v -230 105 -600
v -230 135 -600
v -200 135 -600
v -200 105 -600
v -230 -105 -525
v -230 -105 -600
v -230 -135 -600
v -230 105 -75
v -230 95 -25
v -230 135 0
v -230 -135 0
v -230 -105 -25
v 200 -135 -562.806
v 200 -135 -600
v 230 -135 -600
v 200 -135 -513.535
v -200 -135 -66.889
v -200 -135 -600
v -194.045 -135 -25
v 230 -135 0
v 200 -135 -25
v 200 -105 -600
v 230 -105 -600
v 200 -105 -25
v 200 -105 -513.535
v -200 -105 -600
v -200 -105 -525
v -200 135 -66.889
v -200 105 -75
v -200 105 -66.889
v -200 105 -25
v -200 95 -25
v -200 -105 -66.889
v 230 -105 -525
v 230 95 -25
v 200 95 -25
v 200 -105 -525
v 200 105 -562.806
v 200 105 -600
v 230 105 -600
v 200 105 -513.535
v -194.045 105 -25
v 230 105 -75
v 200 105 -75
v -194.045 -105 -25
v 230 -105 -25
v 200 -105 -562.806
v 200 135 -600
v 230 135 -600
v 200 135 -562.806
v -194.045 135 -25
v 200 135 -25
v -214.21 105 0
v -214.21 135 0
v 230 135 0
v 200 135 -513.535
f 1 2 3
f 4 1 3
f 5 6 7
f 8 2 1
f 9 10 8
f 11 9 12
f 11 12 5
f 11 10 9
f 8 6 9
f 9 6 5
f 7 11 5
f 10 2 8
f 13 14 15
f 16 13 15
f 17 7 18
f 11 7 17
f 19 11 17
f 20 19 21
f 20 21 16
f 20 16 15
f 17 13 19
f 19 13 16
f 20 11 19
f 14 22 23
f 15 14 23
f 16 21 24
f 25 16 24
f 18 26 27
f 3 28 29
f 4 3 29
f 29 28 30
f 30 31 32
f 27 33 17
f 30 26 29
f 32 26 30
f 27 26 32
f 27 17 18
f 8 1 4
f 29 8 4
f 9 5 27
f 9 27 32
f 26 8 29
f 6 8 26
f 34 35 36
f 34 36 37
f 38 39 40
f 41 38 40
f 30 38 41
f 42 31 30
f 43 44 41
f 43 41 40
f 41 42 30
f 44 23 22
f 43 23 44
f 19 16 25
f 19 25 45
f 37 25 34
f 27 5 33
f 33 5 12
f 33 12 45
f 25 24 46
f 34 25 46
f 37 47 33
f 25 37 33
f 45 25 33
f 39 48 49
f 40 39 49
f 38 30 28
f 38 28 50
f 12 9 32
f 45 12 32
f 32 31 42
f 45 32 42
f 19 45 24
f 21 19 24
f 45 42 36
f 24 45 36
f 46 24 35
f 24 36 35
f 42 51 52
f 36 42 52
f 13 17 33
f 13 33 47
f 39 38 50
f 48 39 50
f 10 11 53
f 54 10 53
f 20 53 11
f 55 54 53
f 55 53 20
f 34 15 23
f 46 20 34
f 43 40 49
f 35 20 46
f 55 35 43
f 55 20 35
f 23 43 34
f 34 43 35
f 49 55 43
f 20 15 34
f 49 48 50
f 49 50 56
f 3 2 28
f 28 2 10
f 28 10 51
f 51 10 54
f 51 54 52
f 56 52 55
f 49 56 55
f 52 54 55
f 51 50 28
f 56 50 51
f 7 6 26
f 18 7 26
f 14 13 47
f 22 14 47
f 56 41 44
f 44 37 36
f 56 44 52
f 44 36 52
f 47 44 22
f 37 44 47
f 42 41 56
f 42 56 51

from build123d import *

# Parameters (mm, degrees)
F0_W      = 30
F0_H      = 30
F1_DEPTH  = 600
F2_W      = 460
F2_H      = 270
F3_DEPTH  = 25
F5_DEPTH  = 30
F7_DEPTH  = 30
F9_DEPTH  = 30
F11_DEPTH = 30


with BuildPart() as f1:
    # F0 (on Top) → F1 (new body)
    with BuildSketch(Plane.XY):
        with Locations((-215, 120)):
            Rectangle(F0_W, F0_H)
    extrude(amount=-F1_DEPTH)



with BuildPart() as f1b:
    # F0 (on Top) → F1, piece 2 (new body)
    with BuildSketch(Plane.XY):
        with Locations((-215, -120)):
            Rectangle(F0_W, F0_H)
    extrude(amount=-F1_DEPTH)


with BuildPart() as f1c:
    # F0 (on Top) → F1, piece 3 (new body)
    with BuildSketch(Plane.XY):
        with Locations((215, 120)):
            Rectangle(F0_W, F0_H)
    extrude(amount=-F1_DEPTH)


with BuildPart() as f1d:
    # F0 (on Top) → F1, piece 4 (new body)
    with BuildSketch(Plane.XY):
        with Locations((215, -120)):
            Rectangle(F0_W, F0_H)
    extrude(amount=-F1_DEPTH)


with BuildPart() as f1_1:
    add(f1.part)

    add(f1b.part)  # F3 merges F1b

    add(f1c.part)  # F3 merges F1c

    add(f1d.part)  # F3 merges F1d
    # F2 (on face) → F3 (join)
    with BuildSketch(Plane.XY):
        Rectangle(F2_W, F2_H)
    extrude(amount=-F3_DEPTH)

    # F4 (on face) → F5 (join)
    with BuildSketch(Plane.XZ.offset(135)):
        Polygon((-200, -25), (-200, -66.8888936143), (200, -562.8062018801), (200, -513.5346421648), (-194.0452442551, -25), align=None)
    extrude(amount=-F5_DEPTH)

    # F6 (on face) → F7 (join)
    with BuildSketch(Plane.XZ.offset(-105)):
        Polygon((-214.2098963722, 0), (-230, -29.6950954944), (230, -600), (230, -550.7284402847), align=None)
    extrude(amount=-F7_DEPTH)

    # F8 (on face) → F9 (join)
    with BuildSketch(Plane(origin=(-230, 0, 0), x_dir=(0, -1, 0), z_dir=(-1, 0, 0))):
        Polygon((-105, -25), (-105, -75), (105, -600), (105, -525), (-95, -25), align=None)
    extrude(amount=-F9_DEPTH)

    # F10 (on face) → F11 (join)
    with BuildSketch(Plane.YZ.offset(230)):
        Polygon((95, -25), (-105, -525), (-105, -600), (105, -75), (105, -25), align=None)
    extrude(amount=-F11_DEPTH)


solid = f1_1.part
